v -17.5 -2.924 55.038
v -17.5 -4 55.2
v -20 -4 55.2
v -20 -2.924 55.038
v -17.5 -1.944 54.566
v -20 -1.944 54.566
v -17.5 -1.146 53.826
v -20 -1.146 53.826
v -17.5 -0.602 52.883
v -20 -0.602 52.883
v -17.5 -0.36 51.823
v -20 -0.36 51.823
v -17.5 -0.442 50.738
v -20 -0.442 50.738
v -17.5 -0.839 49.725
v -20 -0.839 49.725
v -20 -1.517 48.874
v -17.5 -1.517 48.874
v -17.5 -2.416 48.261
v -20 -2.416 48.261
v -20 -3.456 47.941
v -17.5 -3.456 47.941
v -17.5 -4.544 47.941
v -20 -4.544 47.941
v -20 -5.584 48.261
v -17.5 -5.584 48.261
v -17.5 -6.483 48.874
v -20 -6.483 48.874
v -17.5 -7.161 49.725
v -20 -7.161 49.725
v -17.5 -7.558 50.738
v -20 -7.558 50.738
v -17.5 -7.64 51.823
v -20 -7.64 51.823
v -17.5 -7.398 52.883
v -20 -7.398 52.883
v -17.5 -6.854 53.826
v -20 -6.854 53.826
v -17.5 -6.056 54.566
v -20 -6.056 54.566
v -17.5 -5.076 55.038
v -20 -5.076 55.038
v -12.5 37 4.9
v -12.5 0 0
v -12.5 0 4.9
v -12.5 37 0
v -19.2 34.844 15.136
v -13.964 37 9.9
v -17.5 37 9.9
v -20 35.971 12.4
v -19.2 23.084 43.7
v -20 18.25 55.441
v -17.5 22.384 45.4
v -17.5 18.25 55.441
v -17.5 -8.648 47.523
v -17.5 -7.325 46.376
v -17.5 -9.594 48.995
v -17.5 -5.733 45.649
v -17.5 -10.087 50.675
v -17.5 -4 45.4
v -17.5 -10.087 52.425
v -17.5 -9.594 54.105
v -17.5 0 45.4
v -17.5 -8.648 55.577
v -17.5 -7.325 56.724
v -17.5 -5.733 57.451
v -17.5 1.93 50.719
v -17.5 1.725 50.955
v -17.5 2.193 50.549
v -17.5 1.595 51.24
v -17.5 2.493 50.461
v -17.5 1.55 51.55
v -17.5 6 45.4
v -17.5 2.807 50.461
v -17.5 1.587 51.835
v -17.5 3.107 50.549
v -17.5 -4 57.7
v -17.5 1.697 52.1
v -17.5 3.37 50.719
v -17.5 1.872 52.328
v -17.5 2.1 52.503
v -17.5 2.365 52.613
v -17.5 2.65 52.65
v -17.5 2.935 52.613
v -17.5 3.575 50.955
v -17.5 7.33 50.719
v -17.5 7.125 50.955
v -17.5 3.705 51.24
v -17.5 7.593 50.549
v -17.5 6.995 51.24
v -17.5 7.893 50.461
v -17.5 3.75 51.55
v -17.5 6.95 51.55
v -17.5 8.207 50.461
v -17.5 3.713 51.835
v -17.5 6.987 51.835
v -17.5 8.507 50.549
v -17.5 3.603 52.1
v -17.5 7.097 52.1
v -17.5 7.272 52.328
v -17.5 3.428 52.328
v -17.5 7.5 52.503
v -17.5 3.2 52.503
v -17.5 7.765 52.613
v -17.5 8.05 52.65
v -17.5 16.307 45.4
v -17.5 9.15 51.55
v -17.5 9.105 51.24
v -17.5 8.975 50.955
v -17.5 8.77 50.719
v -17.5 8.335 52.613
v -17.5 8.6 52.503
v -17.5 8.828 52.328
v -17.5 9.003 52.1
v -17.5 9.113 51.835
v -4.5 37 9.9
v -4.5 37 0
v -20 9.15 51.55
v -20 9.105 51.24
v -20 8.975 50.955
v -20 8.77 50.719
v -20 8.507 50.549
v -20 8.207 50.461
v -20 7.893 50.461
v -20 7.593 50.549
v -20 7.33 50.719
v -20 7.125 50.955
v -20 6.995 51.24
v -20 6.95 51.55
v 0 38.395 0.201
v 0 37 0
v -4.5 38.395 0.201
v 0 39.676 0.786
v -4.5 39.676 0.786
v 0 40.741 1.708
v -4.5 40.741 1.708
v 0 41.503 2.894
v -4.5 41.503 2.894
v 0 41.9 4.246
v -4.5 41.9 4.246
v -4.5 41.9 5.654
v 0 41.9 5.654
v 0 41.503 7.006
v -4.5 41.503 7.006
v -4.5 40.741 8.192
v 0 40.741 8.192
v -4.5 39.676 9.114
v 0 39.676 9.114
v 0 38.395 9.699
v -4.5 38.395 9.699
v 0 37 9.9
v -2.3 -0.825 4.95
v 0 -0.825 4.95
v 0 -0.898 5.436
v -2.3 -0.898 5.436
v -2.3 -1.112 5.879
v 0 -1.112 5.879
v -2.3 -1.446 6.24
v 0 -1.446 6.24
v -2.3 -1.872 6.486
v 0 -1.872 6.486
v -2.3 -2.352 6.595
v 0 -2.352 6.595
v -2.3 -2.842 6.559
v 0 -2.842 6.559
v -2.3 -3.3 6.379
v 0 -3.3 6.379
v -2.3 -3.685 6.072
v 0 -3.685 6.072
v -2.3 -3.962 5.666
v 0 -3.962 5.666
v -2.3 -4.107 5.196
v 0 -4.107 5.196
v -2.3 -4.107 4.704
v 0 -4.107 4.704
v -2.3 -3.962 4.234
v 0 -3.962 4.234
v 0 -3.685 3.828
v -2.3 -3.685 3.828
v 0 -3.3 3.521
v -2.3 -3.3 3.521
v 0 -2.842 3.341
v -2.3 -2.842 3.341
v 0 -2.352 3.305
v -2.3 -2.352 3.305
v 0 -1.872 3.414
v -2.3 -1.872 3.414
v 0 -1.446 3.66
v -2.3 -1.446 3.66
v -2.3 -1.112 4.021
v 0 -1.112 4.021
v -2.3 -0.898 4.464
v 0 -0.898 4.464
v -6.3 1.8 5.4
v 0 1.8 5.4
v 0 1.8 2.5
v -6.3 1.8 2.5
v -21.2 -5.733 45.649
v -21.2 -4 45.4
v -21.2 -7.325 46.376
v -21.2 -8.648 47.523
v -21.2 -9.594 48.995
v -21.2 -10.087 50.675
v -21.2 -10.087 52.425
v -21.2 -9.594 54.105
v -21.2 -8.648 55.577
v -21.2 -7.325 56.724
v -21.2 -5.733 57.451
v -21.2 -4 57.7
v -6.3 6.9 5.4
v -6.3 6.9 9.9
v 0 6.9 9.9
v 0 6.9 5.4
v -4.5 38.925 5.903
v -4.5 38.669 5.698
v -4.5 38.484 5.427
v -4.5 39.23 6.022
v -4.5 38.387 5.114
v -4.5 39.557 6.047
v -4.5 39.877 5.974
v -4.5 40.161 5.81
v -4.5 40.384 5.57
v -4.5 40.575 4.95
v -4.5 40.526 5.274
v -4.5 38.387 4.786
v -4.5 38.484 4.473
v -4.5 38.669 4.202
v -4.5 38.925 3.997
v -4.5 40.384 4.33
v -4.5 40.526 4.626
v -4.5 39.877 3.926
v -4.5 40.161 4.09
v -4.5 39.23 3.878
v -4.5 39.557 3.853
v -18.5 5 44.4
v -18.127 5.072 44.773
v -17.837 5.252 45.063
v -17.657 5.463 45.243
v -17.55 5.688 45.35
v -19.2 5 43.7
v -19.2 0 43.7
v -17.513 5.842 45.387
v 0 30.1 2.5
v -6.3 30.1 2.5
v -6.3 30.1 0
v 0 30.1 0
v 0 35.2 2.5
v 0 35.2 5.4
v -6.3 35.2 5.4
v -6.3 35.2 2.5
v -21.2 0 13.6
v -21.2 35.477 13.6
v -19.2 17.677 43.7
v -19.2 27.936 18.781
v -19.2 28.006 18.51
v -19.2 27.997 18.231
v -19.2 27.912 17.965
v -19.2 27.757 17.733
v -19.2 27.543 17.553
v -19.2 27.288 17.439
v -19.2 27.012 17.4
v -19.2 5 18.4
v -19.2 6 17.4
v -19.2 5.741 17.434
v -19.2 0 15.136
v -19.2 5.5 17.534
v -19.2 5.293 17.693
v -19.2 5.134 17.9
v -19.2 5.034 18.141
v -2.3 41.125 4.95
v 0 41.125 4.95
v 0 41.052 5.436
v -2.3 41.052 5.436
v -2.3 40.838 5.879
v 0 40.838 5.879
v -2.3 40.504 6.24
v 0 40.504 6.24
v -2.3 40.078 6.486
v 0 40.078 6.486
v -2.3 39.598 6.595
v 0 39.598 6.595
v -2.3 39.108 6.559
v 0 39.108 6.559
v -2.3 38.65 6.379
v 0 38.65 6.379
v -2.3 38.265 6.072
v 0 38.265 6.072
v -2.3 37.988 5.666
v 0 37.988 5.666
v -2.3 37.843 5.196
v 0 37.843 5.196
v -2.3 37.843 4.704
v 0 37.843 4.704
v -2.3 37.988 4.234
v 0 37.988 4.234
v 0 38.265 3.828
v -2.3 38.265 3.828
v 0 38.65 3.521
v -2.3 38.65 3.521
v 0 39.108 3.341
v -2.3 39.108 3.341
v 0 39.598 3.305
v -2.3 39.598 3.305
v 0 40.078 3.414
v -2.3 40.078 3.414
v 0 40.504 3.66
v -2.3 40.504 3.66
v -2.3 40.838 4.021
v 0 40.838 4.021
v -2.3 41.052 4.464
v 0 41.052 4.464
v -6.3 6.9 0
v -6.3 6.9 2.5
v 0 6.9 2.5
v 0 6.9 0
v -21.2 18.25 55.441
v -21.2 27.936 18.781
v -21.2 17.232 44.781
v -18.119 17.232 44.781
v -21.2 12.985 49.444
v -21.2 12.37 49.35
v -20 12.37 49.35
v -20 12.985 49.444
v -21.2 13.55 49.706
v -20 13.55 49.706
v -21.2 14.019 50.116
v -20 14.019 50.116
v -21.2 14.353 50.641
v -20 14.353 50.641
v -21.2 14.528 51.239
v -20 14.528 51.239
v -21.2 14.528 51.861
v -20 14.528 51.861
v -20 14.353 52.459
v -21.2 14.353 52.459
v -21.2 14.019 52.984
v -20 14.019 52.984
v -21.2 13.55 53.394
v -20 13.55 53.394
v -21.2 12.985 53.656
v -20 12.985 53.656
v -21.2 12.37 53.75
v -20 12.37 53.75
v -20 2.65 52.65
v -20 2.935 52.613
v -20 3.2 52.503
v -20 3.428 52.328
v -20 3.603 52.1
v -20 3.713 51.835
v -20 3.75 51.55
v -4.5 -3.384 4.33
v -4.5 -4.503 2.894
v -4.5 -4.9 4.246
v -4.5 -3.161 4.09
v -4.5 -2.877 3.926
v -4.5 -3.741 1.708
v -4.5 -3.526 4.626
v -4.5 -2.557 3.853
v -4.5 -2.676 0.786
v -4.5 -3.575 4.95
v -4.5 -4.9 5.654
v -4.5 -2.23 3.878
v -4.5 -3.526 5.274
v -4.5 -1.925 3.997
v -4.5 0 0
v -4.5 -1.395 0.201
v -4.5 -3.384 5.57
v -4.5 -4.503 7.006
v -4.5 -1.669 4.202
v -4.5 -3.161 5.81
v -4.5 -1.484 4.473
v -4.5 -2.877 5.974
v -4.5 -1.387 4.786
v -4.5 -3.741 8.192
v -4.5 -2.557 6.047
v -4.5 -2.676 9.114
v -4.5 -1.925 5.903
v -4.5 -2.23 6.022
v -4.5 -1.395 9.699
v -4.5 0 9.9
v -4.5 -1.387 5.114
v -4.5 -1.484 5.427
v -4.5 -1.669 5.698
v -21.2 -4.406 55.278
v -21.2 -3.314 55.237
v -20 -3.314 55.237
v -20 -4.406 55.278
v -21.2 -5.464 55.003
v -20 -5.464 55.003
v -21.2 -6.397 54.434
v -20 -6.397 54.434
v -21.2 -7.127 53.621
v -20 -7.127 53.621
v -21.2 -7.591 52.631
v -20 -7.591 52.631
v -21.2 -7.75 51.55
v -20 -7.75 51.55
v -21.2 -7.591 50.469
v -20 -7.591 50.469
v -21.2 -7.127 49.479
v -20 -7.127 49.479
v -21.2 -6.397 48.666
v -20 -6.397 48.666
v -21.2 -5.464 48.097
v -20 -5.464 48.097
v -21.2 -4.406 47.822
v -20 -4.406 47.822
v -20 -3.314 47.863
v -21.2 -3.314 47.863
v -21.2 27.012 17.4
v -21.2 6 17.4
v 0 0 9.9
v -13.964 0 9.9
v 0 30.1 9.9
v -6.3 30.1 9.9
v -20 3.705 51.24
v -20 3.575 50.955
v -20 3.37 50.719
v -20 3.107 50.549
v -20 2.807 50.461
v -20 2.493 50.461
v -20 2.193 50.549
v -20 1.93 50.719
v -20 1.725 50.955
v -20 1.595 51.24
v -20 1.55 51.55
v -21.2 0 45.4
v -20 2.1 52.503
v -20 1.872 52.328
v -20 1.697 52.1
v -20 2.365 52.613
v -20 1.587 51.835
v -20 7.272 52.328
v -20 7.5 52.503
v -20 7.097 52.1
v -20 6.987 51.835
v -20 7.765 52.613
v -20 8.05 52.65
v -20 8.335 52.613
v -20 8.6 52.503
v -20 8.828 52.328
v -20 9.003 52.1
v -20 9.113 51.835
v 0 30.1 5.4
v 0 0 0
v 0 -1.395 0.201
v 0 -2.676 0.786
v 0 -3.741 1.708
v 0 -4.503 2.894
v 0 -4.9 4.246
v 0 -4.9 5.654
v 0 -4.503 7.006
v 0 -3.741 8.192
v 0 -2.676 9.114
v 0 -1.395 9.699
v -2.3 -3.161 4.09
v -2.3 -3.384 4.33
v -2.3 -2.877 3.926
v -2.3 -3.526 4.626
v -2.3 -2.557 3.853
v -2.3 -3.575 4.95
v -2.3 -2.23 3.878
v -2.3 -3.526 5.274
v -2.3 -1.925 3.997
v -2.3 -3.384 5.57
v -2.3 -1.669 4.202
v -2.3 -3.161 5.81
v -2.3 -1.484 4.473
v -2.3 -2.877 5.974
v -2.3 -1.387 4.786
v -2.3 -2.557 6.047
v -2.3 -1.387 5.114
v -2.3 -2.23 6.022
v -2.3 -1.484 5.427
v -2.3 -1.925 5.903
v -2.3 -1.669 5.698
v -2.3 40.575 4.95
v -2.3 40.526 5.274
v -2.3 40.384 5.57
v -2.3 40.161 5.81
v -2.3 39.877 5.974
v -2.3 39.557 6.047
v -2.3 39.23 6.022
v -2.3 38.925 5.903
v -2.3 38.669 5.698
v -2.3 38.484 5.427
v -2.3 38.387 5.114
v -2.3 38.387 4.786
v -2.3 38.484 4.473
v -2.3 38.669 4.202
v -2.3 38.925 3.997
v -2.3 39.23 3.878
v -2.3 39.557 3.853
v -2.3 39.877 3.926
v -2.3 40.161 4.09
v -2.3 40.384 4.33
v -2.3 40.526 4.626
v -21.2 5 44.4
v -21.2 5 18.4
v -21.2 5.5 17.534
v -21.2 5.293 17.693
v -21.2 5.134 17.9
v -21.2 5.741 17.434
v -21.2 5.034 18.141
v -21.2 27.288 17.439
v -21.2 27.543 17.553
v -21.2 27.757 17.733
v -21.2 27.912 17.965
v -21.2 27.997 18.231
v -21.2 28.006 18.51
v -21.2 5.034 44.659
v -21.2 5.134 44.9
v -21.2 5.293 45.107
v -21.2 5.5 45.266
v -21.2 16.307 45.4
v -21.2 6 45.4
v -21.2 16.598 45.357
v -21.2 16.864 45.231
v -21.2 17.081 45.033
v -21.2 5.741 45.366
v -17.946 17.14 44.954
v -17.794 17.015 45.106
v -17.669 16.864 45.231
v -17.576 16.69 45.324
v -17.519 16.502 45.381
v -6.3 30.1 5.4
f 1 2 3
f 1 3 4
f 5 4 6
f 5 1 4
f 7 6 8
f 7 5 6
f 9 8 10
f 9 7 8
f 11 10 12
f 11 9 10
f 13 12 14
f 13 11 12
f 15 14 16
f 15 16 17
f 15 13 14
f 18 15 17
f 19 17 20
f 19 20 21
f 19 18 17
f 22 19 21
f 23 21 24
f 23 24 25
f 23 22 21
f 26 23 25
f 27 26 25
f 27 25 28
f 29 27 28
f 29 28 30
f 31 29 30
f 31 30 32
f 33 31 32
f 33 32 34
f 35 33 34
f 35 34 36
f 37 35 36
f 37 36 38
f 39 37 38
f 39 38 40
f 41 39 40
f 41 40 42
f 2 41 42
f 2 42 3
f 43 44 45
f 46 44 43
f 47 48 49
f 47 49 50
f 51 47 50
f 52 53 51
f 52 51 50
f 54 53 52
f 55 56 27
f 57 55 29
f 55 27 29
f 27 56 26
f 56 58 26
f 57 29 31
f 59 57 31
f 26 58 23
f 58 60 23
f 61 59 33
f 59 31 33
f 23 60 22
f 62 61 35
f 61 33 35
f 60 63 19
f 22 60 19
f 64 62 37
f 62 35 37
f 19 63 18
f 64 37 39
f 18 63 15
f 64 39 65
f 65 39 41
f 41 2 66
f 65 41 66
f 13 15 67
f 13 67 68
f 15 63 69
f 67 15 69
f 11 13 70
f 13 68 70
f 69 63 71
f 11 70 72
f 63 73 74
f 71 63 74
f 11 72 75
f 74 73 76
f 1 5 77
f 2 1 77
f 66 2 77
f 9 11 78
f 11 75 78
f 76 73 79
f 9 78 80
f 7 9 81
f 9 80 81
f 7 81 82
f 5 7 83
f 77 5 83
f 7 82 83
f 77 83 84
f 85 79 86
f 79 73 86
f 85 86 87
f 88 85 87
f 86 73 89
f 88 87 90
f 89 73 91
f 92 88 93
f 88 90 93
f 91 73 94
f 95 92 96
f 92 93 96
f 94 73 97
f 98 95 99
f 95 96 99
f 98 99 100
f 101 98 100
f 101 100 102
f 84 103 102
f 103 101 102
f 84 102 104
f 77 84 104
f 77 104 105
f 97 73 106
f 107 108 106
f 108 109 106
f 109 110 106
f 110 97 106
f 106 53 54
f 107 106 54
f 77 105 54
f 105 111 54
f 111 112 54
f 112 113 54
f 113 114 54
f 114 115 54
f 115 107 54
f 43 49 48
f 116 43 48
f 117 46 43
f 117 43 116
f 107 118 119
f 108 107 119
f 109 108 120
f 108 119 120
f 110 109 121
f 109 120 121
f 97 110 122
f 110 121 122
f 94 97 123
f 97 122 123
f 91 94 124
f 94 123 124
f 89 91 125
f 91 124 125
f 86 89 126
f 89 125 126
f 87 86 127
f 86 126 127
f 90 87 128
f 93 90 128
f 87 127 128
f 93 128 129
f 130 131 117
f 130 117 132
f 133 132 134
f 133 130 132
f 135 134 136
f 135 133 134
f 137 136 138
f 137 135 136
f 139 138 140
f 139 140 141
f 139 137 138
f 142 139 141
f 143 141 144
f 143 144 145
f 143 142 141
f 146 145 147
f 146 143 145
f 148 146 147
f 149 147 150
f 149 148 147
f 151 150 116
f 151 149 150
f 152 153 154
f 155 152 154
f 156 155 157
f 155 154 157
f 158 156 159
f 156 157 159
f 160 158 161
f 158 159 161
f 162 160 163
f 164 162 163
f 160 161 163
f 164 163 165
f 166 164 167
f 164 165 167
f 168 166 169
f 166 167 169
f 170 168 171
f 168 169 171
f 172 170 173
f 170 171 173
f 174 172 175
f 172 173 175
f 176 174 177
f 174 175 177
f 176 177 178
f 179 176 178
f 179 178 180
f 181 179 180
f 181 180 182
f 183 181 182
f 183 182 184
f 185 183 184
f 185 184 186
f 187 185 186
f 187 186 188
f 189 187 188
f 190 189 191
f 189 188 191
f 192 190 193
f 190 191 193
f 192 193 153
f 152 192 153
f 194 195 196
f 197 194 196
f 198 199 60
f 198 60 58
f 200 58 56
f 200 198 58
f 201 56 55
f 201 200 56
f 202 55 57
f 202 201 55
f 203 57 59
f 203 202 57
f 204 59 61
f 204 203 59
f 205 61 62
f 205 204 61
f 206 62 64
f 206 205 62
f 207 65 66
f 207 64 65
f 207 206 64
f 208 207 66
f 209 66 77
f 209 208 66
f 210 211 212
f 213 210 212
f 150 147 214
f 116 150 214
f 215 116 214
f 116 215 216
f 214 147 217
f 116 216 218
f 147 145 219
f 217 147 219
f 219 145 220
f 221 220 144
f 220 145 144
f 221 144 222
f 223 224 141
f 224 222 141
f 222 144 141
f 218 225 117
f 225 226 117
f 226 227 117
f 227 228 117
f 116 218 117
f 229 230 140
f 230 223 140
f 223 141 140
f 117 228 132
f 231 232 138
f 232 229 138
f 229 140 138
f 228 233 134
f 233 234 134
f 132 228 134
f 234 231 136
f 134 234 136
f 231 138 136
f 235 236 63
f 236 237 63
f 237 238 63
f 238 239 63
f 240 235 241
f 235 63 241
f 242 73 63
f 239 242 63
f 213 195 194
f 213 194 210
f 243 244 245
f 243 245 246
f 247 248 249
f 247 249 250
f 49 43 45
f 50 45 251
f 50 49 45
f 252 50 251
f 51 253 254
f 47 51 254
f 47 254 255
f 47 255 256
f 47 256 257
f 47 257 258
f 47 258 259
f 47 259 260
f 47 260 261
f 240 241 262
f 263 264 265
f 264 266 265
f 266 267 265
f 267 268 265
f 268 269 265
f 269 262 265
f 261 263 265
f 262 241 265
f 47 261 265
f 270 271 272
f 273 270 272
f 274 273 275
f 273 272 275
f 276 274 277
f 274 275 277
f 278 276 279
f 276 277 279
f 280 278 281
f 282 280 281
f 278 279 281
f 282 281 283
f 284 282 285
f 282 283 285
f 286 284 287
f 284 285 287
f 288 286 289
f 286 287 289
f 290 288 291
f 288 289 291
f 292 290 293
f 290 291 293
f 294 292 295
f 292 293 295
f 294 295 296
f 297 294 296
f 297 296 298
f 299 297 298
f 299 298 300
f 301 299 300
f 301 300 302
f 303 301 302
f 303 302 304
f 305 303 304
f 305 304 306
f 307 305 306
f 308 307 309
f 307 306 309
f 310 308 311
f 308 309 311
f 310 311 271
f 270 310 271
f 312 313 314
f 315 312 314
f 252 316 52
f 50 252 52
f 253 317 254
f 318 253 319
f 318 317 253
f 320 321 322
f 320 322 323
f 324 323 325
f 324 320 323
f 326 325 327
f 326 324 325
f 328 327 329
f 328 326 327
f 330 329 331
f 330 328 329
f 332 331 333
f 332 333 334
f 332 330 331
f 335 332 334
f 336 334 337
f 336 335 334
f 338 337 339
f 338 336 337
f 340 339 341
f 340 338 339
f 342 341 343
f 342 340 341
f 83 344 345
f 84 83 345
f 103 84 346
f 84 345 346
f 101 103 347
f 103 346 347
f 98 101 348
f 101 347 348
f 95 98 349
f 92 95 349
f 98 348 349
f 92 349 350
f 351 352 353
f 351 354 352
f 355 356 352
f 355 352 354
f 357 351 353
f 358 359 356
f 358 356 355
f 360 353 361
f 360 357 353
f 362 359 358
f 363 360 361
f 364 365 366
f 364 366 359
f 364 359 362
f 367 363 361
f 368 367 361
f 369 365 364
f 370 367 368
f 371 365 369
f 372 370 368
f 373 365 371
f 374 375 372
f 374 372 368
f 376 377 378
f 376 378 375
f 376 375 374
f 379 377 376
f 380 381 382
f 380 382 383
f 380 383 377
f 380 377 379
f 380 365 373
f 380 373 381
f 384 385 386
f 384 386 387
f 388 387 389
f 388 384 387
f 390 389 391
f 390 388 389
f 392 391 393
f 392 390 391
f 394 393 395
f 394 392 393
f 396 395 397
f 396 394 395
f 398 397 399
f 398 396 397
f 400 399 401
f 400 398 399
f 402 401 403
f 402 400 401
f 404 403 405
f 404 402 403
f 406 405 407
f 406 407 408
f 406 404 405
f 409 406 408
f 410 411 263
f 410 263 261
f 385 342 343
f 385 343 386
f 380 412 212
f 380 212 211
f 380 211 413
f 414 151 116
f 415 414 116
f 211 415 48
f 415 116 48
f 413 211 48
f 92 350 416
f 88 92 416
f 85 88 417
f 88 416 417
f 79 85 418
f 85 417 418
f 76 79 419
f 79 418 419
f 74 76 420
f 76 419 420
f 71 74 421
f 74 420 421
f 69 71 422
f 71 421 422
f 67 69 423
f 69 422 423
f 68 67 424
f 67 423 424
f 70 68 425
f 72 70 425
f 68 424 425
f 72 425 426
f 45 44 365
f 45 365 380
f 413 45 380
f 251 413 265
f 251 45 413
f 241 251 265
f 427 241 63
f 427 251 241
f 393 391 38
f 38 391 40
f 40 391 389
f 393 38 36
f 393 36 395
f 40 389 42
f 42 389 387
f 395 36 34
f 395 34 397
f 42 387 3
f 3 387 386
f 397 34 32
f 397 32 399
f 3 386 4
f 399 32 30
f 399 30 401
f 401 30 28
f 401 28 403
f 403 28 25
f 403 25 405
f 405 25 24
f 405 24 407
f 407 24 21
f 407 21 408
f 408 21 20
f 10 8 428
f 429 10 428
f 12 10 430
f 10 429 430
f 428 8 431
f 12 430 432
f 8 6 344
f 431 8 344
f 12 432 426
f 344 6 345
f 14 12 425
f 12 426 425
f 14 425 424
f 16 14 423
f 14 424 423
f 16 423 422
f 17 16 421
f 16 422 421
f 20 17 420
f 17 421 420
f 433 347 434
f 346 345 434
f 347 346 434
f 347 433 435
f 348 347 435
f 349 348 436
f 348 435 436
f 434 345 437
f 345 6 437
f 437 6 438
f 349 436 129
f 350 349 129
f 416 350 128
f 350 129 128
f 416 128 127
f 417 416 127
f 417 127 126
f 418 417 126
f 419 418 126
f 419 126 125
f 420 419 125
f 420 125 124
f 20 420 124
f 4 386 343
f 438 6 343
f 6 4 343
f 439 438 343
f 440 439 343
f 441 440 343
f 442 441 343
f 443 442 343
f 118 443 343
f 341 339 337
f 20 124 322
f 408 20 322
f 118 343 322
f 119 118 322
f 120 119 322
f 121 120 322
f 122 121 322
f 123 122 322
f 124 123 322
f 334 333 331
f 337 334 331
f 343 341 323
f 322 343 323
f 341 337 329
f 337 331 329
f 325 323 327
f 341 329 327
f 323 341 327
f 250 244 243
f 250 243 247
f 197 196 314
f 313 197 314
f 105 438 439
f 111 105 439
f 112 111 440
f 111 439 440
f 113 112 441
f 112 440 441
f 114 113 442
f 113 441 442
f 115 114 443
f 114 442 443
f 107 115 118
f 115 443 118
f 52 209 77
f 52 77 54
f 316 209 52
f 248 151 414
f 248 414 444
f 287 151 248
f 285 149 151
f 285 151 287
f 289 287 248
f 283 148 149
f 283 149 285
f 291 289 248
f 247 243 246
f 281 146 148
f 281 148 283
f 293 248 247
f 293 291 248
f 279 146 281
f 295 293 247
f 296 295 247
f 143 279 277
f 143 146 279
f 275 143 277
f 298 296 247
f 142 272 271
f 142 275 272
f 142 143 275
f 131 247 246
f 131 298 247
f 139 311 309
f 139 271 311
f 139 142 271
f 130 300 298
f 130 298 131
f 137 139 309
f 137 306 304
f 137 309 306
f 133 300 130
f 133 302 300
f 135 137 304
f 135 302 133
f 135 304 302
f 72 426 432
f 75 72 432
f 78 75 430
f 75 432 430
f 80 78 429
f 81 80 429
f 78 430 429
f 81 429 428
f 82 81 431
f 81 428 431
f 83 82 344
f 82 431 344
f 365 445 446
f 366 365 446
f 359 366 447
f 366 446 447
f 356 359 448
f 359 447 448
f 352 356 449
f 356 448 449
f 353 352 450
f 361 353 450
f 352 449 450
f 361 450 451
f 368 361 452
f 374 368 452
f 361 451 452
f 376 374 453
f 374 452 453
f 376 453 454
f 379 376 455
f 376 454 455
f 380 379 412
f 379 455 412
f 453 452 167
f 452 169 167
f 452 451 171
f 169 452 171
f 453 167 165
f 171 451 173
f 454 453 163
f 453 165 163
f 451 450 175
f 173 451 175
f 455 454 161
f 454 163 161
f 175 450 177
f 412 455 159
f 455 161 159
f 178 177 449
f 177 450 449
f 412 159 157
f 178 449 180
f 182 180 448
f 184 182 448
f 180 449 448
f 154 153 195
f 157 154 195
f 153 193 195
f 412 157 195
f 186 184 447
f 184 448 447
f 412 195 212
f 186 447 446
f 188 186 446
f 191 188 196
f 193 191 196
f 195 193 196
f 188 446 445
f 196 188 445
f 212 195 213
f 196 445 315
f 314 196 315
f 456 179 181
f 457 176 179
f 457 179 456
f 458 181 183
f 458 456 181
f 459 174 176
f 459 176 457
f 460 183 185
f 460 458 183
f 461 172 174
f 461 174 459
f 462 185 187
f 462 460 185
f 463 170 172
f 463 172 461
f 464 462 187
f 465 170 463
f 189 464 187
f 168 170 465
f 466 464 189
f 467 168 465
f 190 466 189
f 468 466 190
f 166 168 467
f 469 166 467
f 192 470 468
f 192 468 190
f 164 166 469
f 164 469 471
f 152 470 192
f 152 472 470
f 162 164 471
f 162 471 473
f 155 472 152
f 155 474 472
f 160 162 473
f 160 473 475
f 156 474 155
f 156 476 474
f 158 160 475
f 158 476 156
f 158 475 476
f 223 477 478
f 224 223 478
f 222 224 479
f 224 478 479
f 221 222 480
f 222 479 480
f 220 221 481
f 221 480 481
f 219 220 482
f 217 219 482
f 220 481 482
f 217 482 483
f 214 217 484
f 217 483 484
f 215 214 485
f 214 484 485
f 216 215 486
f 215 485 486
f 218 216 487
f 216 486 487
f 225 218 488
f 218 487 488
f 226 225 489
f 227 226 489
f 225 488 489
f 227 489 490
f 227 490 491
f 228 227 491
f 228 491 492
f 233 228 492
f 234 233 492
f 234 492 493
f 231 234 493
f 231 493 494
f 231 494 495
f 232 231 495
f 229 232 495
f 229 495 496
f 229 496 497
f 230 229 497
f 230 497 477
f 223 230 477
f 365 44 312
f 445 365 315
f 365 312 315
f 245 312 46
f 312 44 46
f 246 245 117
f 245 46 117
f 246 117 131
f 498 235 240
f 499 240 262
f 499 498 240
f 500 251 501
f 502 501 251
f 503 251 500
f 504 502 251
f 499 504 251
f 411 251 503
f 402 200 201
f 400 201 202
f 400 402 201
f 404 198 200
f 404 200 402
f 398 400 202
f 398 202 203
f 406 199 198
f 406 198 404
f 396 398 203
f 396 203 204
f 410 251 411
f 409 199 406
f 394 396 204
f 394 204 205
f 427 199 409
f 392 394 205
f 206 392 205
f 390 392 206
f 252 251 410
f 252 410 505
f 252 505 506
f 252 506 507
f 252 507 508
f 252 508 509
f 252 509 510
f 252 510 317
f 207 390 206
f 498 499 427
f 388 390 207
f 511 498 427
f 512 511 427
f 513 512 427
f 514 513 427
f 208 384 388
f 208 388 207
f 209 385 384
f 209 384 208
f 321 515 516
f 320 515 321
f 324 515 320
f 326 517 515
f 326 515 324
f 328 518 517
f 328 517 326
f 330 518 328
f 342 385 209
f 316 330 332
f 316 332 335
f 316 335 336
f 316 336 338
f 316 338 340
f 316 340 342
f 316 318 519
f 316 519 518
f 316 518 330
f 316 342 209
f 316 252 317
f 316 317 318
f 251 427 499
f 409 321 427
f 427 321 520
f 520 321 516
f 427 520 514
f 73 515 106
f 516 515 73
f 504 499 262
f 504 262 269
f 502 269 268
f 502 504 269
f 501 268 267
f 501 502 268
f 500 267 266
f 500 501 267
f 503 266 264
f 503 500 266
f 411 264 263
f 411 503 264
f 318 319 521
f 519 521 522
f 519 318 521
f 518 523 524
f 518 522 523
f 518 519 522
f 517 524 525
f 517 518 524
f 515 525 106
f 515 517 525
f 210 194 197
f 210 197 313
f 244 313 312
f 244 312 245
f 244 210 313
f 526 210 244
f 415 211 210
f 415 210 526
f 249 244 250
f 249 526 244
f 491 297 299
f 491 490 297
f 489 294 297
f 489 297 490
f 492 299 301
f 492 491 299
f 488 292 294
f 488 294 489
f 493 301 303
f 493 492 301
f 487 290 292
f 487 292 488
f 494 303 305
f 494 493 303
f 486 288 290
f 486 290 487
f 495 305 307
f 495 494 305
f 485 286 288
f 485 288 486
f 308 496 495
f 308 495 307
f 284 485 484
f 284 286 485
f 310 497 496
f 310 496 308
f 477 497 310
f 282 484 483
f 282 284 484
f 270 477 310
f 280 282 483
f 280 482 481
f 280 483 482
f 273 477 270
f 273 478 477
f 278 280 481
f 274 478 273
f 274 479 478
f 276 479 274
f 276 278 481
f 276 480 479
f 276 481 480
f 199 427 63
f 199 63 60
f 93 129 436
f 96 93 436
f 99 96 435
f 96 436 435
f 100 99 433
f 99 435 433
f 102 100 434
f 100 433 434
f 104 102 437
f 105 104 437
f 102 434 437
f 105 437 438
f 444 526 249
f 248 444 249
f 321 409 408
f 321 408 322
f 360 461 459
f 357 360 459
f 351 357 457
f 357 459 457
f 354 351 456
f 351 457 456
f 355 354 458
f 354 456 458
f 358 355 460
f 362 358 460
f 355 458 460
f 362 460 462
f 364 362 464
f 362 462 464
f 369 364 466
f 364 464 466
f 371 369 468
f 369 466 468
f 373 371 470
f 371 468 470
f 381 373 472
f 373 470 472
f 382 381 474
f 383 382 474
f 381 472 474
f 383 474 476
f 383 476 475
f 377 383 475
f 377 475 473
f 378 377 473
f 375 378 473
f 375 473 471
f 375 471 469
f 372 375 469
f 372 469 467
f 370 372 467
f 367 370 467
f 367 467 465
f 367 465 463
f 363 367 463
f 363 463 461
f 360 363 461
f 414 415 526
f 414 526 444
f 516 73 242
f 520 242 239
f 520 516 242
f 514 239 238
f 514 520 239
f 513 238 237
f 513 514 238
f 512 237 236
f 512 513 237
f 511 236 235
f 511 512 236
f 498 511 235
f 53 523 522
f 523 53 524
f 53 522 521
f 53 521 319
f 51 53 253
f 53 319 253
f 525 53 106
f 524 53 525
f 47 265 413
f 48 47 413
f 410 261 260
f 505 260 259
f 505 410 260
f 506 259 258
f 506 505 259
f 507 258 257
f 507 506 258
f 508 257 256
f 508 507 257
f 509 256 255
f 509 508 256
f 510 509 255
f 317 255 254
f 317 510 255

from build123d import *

# Parameters (mm, degrees)
SZKIC1_W                    = 12.5
SZKIC1_H                    = 37
DODANIE_WYCI_GNI_CIE1_DEPTH = 9.9
SZKIC2_W                    = 6.3
SZKIC2_H                    = 23.2
WYTNIJ_WYCI_GNI_CIE1_DEPTH  = 9.9
SZKIC3_R                    = 2
SZKIC3_R_2                  = 3.65
DODANIE_WYCI_GNI_CIE2_DEPTH = 7.5
WYTNIJ_WYCI_GNI_CIE2_DEPTH  = 78.151879433
WYTNIJ_WYCI_GNI_CIE3_DEPTH  = 72.402310887
ESQUISSE2_W                 = 2.9
ESQUISSE2_H                 = 5.1
ENL_V_MAT_EXTRU_1_DEPTH     = 6.3
BOSS_EXTRU_2_START          = -2.5
ESQUISSE5_R                 = 3.65
BOSS_EXTRU_2_DEPTH          = 2.5
BOSS_EXTRU_3_DEPTH          = 37
ESQUISSE7_R                 = 1.1
BOSS_EXTRU_4_DEPTH          = 4.5
ESQUISSE8_R                 = 1.65
ESQUISSE8_R_2               = 1.1
ENL_V_MAT_EXTRU_2_DEPTH     = 2.3
BOSS_EXTRU_7_START          = 1.2
BOSS_EXTRU_7_DEPTH          = 1.2
ENL_V_MAT_EXTRU_3_DEPTH     = 75.421317511
ENL_V_MAT_EXTRU_4_DEPTH     = 75.088410025


with BuildPart() as part:
    # Szkic1 → Dodanie-wyciągnięcie1 (new body)
    with BuildSketch(Plane.XY):
        with Locations((-6.25, 18.5)):
            Rectangle(SZKIC1_W, SZKIC1_H)
    extrude(amount=DODANIE_WYCI_GNI_CIE1_DEPTH)

    # Szkic2 → Wytnij-wyciągnięcie1 (cut)
    with BuildSketch(Plane.XY.offset(9.9)):
        with Locations((-3.15, 18.5)):
            Rectangle(SZKIC2_W, SZKIC2_H)
    extrude(amount=-WYTNIJ_WYCI_GNI_CIE1_DEPTH, mode=Mode.SUBTRACT)

    # Szkic3 → Dodanie-wyciągnięcie2 (add)
    with BuildSketch(Plane.ZY.offset(12.5)):
        with BuildLine():
            Line((55.440769231, 18.25), (57.7, -4))
            ThreePointArc((57.7, -4), (51.55, -10.15), (45.4, -4))
            Line((45.4, -4), (45.4, 0))
            Line((45.4, 0), (7.4, 0))
            Line((7.4, 0), (7.4, 37))
            Line((7.4, 37), (9.9, 37))
            Line((9.9, 37), (55.440769231, 18.25))
        make_face()
        with Locations((51.55, 12.25)):
            Circle(SZKIC3_R, mode=Mode.SUBTRACT)
        with Locations((51.55, -4)):
            Circle(SZKIC3_R_2, mode=Mode.SUBTRACT)
    extrude(amount=DODANIE_WYCI_GNI_CIE2_DEPTH)

    # Szkic4 → Wytnij-wyciągnięcie2 (cut, through all)
    with BuildSketch(Plane(origin=(0, 37, 0), x_dir=(1, 0, 0), z_dir=(0, 1, 0))):
        Polygon((-17.5, -9.9), (-15, -7.4), (-20, -7.4), (-20, -9.9), align=None)
        Polygon((-20, -12.4), (-17.5, -9.9), (-20, -9.9), align=None)
        Polygon((-12.5, -9.9), (-13.964466094, -9.9), (-17.5, -13.435533906), (-17.5, -57.7), (-12.5, -57.7), (-12.5, -55.440769231), align=None)
    extrude(amount=-WYTNIJ_WYCI_GNI_CIE2_DEPTH, mode=Mode.SUBTRACT)

    # Szkic5 → Wytnij-wyciągnięcie3 (cut, through all)
    with BuildSketch(Plane.ZY.offset(20)):
        with BuildLine():
            Line((45.4, 16.307054303), (45.4, 6))
            ThreePointArc((45.4, 6), (45.107106781, 5.292893219), (44.4, 5))
            Line((44.4, 5), (18.4, 5))
            ThreePointArc((18.4, 5), (17.692893219, 5.292893219), (17.4, 6))
            Line((17.4, 6), (17.4, 27.011748322))
            ThreePointArc((17.4, 27.011748322), (17.843544103, 27.842625469), (18.780713669, 27.936441299))
            Line((18.780713669, 27.936441299), (44.780713669, 17.23174728))
            ThreePointArc((44.780713669, 17.23174728), (45.230877148, 16.8635102), (45.4, 16.307054303))
        make_face()
    extrude(amount=-WYTNIJ_WYCI_GNI_CIE3_DEPTH, mode=Mode.SUBTRACT)

    # Esquisse2 → Enlèv. mat.-Extru.1 (cut)
    with BuildSketch(Plane(origin=(0, 0, 0), x_dir=(0, 0, -1), z_dir=(1, 0, 0))):
        with Locations((-3.95, 32.65)):
            Rectangle(ESQUISSE2_W, ESQUISSE2_H)
        with Locations((-3.95, 4.35)):
            Rectangle(ESQUISSE2_W, ESQUISSE2_H)
    extrude(amount=-ENL_V_MAT_EXTRU_1_DEPTH, mode=Mode.SUBTRACT)

    # Esquisse5 → Boss.-Extru.2 (add)
    with BuildSketch(Plane(origin=(-17.5, 0, 0), x_dir=(0, 0, -1), z_dir=(1, 0, 0)).offset(BOSS_EXTRU_2_START)):
        with BuildLine():
            Line((-13.435533906, 0), (-13.435533906, 35.544353513))
            Line((-13.435533906, 35.544353513), (-55.440769231, 18.25))
            Line((-55.440769231, 18.25), (-57.7, -4))
            ThreePointArc((-57.7, -4), (-51.55, -10.15), (-45.4, -4))
            Line((-45.4, -4), (-45.4, 0))
            Line((-45.4, 0), (-13.435533906, 0))
        make_face()
        with Locations(Location((-51.55, -4, 0), (0, 0, 180))):
            Circle(ESQUISSE5_R, mode=Mode.SUBTRACT)
        with BuildLine():
            Line((-17.4, 6), (-17.4, 27.011748322))
            ThreePointArc((-17.4, 27.011748322), (-17.843544103, 27.842625469), (-18.780713669, 27.936441299))
            Line((-18.780713669, 27.936441299), (-44.780713669, 17.23174728))
            ThreePointArc((-44.780713669, 17.23174728), (-45.230877148, 16.8635102), (-45.4, 16.307054303))
            Line((-45.4, 16.307054303), (-45.4, 6))
            ThreePointArc((-45.4, 6), (-45.107106781, 5.292893219), (-44.4, 5))
            Line((-44.4, 5), (-18.4, 5))
            ThreePointArc((-18.4, 5), (-17.692893219, 5.292893219), (-17.4, 6))
        make_face(mode=Mode.SUBTRACT)
    extrude(amount=BOSS_EXTRU_2_DEPTH)

    # Esquisse6 → Boss.-Extru.3 (add)
    with BuildSketch(Plane(origin=(0, 37, 0), x_dir=(1, 0, 0), z_dir=(0, 1, 0))):
        Polygon((-12.5, -4.9), (-15, -7.4), (-12.5, -7.4), align=None)
    extrude(amount=-BOSS_EXTRU_3_DEPTH)

    # Esquisse7 → Boss.-Extru.4 (add)
    # profile 1 of 2: a face of its own
    with BuildSketch(Plane(origin=(0, 0, 0), x_dir=(0, 0, -1), z_dir=(1, 0, 0))):
        with BuildLine():
            Line((-9.9, 37), (0, 37))
            ThreePointArc((0, 37), (-4.95, 41.95), (-9.9, 37))
        make_face()
        with Locations(Location((-4.95, 39.475, 0), (0, 0, 90))):
            Circle(ESQUISSE7_R, mode=Mode.SUBTRACT)
    # profile 2 of 2: a face of its own
    with BuildSketch(Plane(origin=(0, 0, 0), x_dir=(0, 0, -1), z_dir=(1, 0, 0))):
        with BuildLine():
            Line((-9.9, 0), (0, 0))
            ThreePointArc((0, 0), (-4.95, -4.95), (-9.9, 0))
        make_face()
        with Locations(Location((-4.95, -2.475, 0), (0, 0, 270))):
            Circle(ESQUISSE7_R, mode=Mode.SUBTRACT)
    extrude(amount=-BOSS_EXTRU_4_DEPTH)

    # Esquisse8 → Enlèv. mat.-Extru.2 (cut)
    # profile 1 of 2: a face of its own
    with BuildSketch(Plane(origin=(0, 0, 0), x_dir=(0, 0, -1), z_dir=(1, 0, 0))):
        with Locations(Location((-4.95, 39.475, 0), (0, 0, 90))):
            Circle(ESQUISSE8_R)
        with Locations(Location((-4.95, 39.475, 0), (0, 0, 90))):
            Circle(ESQUISSE8_R_2, mode=Mode.SUBTRACT)
    # profile 2 of 2: a face of its own
    with BuildSketch(Plane(origin=(0, 0, 0), x_dir=(0, 0, -1), z_dir=(1, 0, 0))):
        with Locations(Location((-4.95, -2.475, 0), (0, 0, 90))):
            Circle(ESQUISSE8_R)
        with Locations(Location((-4.95, -2.475, 0), (0, 0, 90))):
            Circle(ESQUISSE8_R_2, mode=Mode.SUBTRACT)
    extrude(amount=-ENL_V_MAT_EXTRU_2_DEPTH, mode=Mode.SUBTRACT)

    # Esquisse9 → Boss.-Extru.7 (add)
    with BuildSketch(Plane.ZY.offset(20).offset(BOSS_EXTRU_7_START)):
        with BuildLine():
            Line((12.4, 35.970702498), (12.4, 0))
            Line((12.4, 0), (45.4, 0))
            Line((45.4, 0), (45.4, -4))
            ThreePointArc((45.4, -4), (51.55, -10.15), (57.7, -4))
            Line((57.7, -4), (55.440769231, 18.25))
            Line((55.440769231, 18.25), (12.4, 35.970702498))
        make_face()
        with BuildLine():
            Line((47.863295083, -3.313919205), (49.350089671, 12.369863153))
            ThreePointArc((49.350089671, 12.369863153), (51.55, 14.55), (53.749910329, 12.369863153))
            Line((53.749910329, 12.369863153), (55.236704917, -3.313919205))
            ThreePointArc((55.236704917, -3.313919205), (51.55, -7.75), (47.863295083, -3.313919205))
        make_face(mode=Mode.SUBTRACT)
        with BuildLine():
            Line((18.780713669, 27.936441299), (44.780713669, 17.23174728))
            ThreePointArc((44.780713669, 17.23174728), (45.230877148, 16.8635102), (45.4, 16.307054303))
            Line((45.4, 16.307054303), (45.4, 6))
            ThreePointArc((45.4, 6), (45.107106781, 5.292893219), (44.4, 5))
            Line((44.4, 5), (18.4, 5))
            ThreePointArc((18.4, 5), (17.692893219, 5.292893219), (17.4, 6))
            Line((17.4, 6), (17.4, 27.011748322))
            ThreePointArc((17.4, 27.011748322), (17.843544103, 27.842625469), (18.780713669, 27.936441299))
        make_face(mode=Mode.SUBTRACT)
    extrude(amount=-BOSS_EXTRU_7_DEPTH)

    # Esquisse10 → Enlèv. mat.-Extru.3 (cut, through all)
    with BuildSketch(Plane.XZ):
        Polygon((-19.2, 43.7), (-19.2, 15.135533906), (-17.5, 13.435533906), (-17.5, 45.4), align=None)
        Polygon((-21.2, 12.4), (-20, 12.4), (-21.2, 13.6), align=None)
    extrude(amount=-ENL_V_MAT_EXTRU_3_DEPTH, mode=Mode.SUBTRACT)

    # Esquisse11 → Enlèv. mat.-Extru.4 (cut, through all)
    with BuildSketch(Plane.ZY.offset(20)):
        with BuildLine():
            ThreePointArc((52.05, 8.05), (51.903553391, 8.403553391), (51.55, 8.55))
            Line((51.55, 8.55), (51.55, 7.55))
            ThreePointArc((51.55, 7.55), (51.903553391, 7.696446609), (52.05, 8.05))
        make_face()
        with BuildLine():
            Line((51.55, 7.55), (51.55, 8.55))
            ThreePointArc((51.55, 8.55), (51.05, 8.05), (51.55, 7.55))
        make_face()
        with BuildLine():
            ThreePointArc((52.65, 8.05), (52.327817459, 8.827817459), (51.55, 9.15))
            Line((51.55, 9.15), (51.55, 8.55))
            ThreePointArc((51.55, 8.55), (51.903553391, 8.403553391), (52.05, 8.05))
            ThreePointArc((52.05, 8.05), (51.903553391, 7.696446609), (51.55, 7.55))
            Line((51.55, 7.55), (51.55, 6.95))
            ThreePointArc((51.55, 6.95), (52.327817459, 7.272182541), (52.65, 8.05))
        make_face()
        with BuildLine():
            Line((51.55, 8.55), (51.55, 9.15))
            ThreePointArc((51.55, 9.15), (50.45, 8.05), (51.55, 6.95))
            Line((51.55, 6.95), (51.55, 7.55))
            ThreePointArc((51.55, 7.55), (51.05, 8.05), (51.55, 8.55))
        make_face()
        with BuildLine():
            ThreePointArc((51.55, 3.75), (50.45, 2.65), (51.55, 1.55))
            Line((51.55, 1.55), (51.55, 2.15))
            ThreePointArc((51.55, 2.15), (51.05, 2.65), (51.55, 3.15))
            Line((51.55, 3.15), (51.55, 3.75))
        make_face()
        with BuildLine():
            Line((51.55, 2.15), (51.55, 1.55))
            ThreePointArc((51.55, 1.55), (52.327817459, 1.872182541), (52.65, 2.65))
            ThreePointArc((52.65, 2.65), (52.327817459, 3.427817459), (51.55, 3.75))
            Line((51.55, 3.75), (51.55, 3.15))
            ThreePointArc((51.55, 3.15), (51.903553391, 3.003553391), (52.05, 2.65))
            ThreePointArc((52.05, 2.65), (51.903553391, 2.296446609), (51.55, 2.15))
        make_face()
        with BuildLine():
            ThreePointArc((51.55, 3.15), (51.05, 2.65), (51.55, 2.15))
            Line((51.55, 2.15), (51.55, 3.15))
        make_face()
        with BuildLine():
            Line((51.55, 3.15), (51.55, 2.15))
            ThreePointArc((51.55, 2.15), (51.903553391, 2.296446609), (52.05, 2.65))
            ThreePointArc((52.05, 2.65), (51.903553391, 3.003553391), (51.55, 3.15))
        make_face()
    extrude(amount=-ENL_V_MAT_EXTRU_4_DEPTH, mode=Mode.SUBTRACT)


solid = part.part
